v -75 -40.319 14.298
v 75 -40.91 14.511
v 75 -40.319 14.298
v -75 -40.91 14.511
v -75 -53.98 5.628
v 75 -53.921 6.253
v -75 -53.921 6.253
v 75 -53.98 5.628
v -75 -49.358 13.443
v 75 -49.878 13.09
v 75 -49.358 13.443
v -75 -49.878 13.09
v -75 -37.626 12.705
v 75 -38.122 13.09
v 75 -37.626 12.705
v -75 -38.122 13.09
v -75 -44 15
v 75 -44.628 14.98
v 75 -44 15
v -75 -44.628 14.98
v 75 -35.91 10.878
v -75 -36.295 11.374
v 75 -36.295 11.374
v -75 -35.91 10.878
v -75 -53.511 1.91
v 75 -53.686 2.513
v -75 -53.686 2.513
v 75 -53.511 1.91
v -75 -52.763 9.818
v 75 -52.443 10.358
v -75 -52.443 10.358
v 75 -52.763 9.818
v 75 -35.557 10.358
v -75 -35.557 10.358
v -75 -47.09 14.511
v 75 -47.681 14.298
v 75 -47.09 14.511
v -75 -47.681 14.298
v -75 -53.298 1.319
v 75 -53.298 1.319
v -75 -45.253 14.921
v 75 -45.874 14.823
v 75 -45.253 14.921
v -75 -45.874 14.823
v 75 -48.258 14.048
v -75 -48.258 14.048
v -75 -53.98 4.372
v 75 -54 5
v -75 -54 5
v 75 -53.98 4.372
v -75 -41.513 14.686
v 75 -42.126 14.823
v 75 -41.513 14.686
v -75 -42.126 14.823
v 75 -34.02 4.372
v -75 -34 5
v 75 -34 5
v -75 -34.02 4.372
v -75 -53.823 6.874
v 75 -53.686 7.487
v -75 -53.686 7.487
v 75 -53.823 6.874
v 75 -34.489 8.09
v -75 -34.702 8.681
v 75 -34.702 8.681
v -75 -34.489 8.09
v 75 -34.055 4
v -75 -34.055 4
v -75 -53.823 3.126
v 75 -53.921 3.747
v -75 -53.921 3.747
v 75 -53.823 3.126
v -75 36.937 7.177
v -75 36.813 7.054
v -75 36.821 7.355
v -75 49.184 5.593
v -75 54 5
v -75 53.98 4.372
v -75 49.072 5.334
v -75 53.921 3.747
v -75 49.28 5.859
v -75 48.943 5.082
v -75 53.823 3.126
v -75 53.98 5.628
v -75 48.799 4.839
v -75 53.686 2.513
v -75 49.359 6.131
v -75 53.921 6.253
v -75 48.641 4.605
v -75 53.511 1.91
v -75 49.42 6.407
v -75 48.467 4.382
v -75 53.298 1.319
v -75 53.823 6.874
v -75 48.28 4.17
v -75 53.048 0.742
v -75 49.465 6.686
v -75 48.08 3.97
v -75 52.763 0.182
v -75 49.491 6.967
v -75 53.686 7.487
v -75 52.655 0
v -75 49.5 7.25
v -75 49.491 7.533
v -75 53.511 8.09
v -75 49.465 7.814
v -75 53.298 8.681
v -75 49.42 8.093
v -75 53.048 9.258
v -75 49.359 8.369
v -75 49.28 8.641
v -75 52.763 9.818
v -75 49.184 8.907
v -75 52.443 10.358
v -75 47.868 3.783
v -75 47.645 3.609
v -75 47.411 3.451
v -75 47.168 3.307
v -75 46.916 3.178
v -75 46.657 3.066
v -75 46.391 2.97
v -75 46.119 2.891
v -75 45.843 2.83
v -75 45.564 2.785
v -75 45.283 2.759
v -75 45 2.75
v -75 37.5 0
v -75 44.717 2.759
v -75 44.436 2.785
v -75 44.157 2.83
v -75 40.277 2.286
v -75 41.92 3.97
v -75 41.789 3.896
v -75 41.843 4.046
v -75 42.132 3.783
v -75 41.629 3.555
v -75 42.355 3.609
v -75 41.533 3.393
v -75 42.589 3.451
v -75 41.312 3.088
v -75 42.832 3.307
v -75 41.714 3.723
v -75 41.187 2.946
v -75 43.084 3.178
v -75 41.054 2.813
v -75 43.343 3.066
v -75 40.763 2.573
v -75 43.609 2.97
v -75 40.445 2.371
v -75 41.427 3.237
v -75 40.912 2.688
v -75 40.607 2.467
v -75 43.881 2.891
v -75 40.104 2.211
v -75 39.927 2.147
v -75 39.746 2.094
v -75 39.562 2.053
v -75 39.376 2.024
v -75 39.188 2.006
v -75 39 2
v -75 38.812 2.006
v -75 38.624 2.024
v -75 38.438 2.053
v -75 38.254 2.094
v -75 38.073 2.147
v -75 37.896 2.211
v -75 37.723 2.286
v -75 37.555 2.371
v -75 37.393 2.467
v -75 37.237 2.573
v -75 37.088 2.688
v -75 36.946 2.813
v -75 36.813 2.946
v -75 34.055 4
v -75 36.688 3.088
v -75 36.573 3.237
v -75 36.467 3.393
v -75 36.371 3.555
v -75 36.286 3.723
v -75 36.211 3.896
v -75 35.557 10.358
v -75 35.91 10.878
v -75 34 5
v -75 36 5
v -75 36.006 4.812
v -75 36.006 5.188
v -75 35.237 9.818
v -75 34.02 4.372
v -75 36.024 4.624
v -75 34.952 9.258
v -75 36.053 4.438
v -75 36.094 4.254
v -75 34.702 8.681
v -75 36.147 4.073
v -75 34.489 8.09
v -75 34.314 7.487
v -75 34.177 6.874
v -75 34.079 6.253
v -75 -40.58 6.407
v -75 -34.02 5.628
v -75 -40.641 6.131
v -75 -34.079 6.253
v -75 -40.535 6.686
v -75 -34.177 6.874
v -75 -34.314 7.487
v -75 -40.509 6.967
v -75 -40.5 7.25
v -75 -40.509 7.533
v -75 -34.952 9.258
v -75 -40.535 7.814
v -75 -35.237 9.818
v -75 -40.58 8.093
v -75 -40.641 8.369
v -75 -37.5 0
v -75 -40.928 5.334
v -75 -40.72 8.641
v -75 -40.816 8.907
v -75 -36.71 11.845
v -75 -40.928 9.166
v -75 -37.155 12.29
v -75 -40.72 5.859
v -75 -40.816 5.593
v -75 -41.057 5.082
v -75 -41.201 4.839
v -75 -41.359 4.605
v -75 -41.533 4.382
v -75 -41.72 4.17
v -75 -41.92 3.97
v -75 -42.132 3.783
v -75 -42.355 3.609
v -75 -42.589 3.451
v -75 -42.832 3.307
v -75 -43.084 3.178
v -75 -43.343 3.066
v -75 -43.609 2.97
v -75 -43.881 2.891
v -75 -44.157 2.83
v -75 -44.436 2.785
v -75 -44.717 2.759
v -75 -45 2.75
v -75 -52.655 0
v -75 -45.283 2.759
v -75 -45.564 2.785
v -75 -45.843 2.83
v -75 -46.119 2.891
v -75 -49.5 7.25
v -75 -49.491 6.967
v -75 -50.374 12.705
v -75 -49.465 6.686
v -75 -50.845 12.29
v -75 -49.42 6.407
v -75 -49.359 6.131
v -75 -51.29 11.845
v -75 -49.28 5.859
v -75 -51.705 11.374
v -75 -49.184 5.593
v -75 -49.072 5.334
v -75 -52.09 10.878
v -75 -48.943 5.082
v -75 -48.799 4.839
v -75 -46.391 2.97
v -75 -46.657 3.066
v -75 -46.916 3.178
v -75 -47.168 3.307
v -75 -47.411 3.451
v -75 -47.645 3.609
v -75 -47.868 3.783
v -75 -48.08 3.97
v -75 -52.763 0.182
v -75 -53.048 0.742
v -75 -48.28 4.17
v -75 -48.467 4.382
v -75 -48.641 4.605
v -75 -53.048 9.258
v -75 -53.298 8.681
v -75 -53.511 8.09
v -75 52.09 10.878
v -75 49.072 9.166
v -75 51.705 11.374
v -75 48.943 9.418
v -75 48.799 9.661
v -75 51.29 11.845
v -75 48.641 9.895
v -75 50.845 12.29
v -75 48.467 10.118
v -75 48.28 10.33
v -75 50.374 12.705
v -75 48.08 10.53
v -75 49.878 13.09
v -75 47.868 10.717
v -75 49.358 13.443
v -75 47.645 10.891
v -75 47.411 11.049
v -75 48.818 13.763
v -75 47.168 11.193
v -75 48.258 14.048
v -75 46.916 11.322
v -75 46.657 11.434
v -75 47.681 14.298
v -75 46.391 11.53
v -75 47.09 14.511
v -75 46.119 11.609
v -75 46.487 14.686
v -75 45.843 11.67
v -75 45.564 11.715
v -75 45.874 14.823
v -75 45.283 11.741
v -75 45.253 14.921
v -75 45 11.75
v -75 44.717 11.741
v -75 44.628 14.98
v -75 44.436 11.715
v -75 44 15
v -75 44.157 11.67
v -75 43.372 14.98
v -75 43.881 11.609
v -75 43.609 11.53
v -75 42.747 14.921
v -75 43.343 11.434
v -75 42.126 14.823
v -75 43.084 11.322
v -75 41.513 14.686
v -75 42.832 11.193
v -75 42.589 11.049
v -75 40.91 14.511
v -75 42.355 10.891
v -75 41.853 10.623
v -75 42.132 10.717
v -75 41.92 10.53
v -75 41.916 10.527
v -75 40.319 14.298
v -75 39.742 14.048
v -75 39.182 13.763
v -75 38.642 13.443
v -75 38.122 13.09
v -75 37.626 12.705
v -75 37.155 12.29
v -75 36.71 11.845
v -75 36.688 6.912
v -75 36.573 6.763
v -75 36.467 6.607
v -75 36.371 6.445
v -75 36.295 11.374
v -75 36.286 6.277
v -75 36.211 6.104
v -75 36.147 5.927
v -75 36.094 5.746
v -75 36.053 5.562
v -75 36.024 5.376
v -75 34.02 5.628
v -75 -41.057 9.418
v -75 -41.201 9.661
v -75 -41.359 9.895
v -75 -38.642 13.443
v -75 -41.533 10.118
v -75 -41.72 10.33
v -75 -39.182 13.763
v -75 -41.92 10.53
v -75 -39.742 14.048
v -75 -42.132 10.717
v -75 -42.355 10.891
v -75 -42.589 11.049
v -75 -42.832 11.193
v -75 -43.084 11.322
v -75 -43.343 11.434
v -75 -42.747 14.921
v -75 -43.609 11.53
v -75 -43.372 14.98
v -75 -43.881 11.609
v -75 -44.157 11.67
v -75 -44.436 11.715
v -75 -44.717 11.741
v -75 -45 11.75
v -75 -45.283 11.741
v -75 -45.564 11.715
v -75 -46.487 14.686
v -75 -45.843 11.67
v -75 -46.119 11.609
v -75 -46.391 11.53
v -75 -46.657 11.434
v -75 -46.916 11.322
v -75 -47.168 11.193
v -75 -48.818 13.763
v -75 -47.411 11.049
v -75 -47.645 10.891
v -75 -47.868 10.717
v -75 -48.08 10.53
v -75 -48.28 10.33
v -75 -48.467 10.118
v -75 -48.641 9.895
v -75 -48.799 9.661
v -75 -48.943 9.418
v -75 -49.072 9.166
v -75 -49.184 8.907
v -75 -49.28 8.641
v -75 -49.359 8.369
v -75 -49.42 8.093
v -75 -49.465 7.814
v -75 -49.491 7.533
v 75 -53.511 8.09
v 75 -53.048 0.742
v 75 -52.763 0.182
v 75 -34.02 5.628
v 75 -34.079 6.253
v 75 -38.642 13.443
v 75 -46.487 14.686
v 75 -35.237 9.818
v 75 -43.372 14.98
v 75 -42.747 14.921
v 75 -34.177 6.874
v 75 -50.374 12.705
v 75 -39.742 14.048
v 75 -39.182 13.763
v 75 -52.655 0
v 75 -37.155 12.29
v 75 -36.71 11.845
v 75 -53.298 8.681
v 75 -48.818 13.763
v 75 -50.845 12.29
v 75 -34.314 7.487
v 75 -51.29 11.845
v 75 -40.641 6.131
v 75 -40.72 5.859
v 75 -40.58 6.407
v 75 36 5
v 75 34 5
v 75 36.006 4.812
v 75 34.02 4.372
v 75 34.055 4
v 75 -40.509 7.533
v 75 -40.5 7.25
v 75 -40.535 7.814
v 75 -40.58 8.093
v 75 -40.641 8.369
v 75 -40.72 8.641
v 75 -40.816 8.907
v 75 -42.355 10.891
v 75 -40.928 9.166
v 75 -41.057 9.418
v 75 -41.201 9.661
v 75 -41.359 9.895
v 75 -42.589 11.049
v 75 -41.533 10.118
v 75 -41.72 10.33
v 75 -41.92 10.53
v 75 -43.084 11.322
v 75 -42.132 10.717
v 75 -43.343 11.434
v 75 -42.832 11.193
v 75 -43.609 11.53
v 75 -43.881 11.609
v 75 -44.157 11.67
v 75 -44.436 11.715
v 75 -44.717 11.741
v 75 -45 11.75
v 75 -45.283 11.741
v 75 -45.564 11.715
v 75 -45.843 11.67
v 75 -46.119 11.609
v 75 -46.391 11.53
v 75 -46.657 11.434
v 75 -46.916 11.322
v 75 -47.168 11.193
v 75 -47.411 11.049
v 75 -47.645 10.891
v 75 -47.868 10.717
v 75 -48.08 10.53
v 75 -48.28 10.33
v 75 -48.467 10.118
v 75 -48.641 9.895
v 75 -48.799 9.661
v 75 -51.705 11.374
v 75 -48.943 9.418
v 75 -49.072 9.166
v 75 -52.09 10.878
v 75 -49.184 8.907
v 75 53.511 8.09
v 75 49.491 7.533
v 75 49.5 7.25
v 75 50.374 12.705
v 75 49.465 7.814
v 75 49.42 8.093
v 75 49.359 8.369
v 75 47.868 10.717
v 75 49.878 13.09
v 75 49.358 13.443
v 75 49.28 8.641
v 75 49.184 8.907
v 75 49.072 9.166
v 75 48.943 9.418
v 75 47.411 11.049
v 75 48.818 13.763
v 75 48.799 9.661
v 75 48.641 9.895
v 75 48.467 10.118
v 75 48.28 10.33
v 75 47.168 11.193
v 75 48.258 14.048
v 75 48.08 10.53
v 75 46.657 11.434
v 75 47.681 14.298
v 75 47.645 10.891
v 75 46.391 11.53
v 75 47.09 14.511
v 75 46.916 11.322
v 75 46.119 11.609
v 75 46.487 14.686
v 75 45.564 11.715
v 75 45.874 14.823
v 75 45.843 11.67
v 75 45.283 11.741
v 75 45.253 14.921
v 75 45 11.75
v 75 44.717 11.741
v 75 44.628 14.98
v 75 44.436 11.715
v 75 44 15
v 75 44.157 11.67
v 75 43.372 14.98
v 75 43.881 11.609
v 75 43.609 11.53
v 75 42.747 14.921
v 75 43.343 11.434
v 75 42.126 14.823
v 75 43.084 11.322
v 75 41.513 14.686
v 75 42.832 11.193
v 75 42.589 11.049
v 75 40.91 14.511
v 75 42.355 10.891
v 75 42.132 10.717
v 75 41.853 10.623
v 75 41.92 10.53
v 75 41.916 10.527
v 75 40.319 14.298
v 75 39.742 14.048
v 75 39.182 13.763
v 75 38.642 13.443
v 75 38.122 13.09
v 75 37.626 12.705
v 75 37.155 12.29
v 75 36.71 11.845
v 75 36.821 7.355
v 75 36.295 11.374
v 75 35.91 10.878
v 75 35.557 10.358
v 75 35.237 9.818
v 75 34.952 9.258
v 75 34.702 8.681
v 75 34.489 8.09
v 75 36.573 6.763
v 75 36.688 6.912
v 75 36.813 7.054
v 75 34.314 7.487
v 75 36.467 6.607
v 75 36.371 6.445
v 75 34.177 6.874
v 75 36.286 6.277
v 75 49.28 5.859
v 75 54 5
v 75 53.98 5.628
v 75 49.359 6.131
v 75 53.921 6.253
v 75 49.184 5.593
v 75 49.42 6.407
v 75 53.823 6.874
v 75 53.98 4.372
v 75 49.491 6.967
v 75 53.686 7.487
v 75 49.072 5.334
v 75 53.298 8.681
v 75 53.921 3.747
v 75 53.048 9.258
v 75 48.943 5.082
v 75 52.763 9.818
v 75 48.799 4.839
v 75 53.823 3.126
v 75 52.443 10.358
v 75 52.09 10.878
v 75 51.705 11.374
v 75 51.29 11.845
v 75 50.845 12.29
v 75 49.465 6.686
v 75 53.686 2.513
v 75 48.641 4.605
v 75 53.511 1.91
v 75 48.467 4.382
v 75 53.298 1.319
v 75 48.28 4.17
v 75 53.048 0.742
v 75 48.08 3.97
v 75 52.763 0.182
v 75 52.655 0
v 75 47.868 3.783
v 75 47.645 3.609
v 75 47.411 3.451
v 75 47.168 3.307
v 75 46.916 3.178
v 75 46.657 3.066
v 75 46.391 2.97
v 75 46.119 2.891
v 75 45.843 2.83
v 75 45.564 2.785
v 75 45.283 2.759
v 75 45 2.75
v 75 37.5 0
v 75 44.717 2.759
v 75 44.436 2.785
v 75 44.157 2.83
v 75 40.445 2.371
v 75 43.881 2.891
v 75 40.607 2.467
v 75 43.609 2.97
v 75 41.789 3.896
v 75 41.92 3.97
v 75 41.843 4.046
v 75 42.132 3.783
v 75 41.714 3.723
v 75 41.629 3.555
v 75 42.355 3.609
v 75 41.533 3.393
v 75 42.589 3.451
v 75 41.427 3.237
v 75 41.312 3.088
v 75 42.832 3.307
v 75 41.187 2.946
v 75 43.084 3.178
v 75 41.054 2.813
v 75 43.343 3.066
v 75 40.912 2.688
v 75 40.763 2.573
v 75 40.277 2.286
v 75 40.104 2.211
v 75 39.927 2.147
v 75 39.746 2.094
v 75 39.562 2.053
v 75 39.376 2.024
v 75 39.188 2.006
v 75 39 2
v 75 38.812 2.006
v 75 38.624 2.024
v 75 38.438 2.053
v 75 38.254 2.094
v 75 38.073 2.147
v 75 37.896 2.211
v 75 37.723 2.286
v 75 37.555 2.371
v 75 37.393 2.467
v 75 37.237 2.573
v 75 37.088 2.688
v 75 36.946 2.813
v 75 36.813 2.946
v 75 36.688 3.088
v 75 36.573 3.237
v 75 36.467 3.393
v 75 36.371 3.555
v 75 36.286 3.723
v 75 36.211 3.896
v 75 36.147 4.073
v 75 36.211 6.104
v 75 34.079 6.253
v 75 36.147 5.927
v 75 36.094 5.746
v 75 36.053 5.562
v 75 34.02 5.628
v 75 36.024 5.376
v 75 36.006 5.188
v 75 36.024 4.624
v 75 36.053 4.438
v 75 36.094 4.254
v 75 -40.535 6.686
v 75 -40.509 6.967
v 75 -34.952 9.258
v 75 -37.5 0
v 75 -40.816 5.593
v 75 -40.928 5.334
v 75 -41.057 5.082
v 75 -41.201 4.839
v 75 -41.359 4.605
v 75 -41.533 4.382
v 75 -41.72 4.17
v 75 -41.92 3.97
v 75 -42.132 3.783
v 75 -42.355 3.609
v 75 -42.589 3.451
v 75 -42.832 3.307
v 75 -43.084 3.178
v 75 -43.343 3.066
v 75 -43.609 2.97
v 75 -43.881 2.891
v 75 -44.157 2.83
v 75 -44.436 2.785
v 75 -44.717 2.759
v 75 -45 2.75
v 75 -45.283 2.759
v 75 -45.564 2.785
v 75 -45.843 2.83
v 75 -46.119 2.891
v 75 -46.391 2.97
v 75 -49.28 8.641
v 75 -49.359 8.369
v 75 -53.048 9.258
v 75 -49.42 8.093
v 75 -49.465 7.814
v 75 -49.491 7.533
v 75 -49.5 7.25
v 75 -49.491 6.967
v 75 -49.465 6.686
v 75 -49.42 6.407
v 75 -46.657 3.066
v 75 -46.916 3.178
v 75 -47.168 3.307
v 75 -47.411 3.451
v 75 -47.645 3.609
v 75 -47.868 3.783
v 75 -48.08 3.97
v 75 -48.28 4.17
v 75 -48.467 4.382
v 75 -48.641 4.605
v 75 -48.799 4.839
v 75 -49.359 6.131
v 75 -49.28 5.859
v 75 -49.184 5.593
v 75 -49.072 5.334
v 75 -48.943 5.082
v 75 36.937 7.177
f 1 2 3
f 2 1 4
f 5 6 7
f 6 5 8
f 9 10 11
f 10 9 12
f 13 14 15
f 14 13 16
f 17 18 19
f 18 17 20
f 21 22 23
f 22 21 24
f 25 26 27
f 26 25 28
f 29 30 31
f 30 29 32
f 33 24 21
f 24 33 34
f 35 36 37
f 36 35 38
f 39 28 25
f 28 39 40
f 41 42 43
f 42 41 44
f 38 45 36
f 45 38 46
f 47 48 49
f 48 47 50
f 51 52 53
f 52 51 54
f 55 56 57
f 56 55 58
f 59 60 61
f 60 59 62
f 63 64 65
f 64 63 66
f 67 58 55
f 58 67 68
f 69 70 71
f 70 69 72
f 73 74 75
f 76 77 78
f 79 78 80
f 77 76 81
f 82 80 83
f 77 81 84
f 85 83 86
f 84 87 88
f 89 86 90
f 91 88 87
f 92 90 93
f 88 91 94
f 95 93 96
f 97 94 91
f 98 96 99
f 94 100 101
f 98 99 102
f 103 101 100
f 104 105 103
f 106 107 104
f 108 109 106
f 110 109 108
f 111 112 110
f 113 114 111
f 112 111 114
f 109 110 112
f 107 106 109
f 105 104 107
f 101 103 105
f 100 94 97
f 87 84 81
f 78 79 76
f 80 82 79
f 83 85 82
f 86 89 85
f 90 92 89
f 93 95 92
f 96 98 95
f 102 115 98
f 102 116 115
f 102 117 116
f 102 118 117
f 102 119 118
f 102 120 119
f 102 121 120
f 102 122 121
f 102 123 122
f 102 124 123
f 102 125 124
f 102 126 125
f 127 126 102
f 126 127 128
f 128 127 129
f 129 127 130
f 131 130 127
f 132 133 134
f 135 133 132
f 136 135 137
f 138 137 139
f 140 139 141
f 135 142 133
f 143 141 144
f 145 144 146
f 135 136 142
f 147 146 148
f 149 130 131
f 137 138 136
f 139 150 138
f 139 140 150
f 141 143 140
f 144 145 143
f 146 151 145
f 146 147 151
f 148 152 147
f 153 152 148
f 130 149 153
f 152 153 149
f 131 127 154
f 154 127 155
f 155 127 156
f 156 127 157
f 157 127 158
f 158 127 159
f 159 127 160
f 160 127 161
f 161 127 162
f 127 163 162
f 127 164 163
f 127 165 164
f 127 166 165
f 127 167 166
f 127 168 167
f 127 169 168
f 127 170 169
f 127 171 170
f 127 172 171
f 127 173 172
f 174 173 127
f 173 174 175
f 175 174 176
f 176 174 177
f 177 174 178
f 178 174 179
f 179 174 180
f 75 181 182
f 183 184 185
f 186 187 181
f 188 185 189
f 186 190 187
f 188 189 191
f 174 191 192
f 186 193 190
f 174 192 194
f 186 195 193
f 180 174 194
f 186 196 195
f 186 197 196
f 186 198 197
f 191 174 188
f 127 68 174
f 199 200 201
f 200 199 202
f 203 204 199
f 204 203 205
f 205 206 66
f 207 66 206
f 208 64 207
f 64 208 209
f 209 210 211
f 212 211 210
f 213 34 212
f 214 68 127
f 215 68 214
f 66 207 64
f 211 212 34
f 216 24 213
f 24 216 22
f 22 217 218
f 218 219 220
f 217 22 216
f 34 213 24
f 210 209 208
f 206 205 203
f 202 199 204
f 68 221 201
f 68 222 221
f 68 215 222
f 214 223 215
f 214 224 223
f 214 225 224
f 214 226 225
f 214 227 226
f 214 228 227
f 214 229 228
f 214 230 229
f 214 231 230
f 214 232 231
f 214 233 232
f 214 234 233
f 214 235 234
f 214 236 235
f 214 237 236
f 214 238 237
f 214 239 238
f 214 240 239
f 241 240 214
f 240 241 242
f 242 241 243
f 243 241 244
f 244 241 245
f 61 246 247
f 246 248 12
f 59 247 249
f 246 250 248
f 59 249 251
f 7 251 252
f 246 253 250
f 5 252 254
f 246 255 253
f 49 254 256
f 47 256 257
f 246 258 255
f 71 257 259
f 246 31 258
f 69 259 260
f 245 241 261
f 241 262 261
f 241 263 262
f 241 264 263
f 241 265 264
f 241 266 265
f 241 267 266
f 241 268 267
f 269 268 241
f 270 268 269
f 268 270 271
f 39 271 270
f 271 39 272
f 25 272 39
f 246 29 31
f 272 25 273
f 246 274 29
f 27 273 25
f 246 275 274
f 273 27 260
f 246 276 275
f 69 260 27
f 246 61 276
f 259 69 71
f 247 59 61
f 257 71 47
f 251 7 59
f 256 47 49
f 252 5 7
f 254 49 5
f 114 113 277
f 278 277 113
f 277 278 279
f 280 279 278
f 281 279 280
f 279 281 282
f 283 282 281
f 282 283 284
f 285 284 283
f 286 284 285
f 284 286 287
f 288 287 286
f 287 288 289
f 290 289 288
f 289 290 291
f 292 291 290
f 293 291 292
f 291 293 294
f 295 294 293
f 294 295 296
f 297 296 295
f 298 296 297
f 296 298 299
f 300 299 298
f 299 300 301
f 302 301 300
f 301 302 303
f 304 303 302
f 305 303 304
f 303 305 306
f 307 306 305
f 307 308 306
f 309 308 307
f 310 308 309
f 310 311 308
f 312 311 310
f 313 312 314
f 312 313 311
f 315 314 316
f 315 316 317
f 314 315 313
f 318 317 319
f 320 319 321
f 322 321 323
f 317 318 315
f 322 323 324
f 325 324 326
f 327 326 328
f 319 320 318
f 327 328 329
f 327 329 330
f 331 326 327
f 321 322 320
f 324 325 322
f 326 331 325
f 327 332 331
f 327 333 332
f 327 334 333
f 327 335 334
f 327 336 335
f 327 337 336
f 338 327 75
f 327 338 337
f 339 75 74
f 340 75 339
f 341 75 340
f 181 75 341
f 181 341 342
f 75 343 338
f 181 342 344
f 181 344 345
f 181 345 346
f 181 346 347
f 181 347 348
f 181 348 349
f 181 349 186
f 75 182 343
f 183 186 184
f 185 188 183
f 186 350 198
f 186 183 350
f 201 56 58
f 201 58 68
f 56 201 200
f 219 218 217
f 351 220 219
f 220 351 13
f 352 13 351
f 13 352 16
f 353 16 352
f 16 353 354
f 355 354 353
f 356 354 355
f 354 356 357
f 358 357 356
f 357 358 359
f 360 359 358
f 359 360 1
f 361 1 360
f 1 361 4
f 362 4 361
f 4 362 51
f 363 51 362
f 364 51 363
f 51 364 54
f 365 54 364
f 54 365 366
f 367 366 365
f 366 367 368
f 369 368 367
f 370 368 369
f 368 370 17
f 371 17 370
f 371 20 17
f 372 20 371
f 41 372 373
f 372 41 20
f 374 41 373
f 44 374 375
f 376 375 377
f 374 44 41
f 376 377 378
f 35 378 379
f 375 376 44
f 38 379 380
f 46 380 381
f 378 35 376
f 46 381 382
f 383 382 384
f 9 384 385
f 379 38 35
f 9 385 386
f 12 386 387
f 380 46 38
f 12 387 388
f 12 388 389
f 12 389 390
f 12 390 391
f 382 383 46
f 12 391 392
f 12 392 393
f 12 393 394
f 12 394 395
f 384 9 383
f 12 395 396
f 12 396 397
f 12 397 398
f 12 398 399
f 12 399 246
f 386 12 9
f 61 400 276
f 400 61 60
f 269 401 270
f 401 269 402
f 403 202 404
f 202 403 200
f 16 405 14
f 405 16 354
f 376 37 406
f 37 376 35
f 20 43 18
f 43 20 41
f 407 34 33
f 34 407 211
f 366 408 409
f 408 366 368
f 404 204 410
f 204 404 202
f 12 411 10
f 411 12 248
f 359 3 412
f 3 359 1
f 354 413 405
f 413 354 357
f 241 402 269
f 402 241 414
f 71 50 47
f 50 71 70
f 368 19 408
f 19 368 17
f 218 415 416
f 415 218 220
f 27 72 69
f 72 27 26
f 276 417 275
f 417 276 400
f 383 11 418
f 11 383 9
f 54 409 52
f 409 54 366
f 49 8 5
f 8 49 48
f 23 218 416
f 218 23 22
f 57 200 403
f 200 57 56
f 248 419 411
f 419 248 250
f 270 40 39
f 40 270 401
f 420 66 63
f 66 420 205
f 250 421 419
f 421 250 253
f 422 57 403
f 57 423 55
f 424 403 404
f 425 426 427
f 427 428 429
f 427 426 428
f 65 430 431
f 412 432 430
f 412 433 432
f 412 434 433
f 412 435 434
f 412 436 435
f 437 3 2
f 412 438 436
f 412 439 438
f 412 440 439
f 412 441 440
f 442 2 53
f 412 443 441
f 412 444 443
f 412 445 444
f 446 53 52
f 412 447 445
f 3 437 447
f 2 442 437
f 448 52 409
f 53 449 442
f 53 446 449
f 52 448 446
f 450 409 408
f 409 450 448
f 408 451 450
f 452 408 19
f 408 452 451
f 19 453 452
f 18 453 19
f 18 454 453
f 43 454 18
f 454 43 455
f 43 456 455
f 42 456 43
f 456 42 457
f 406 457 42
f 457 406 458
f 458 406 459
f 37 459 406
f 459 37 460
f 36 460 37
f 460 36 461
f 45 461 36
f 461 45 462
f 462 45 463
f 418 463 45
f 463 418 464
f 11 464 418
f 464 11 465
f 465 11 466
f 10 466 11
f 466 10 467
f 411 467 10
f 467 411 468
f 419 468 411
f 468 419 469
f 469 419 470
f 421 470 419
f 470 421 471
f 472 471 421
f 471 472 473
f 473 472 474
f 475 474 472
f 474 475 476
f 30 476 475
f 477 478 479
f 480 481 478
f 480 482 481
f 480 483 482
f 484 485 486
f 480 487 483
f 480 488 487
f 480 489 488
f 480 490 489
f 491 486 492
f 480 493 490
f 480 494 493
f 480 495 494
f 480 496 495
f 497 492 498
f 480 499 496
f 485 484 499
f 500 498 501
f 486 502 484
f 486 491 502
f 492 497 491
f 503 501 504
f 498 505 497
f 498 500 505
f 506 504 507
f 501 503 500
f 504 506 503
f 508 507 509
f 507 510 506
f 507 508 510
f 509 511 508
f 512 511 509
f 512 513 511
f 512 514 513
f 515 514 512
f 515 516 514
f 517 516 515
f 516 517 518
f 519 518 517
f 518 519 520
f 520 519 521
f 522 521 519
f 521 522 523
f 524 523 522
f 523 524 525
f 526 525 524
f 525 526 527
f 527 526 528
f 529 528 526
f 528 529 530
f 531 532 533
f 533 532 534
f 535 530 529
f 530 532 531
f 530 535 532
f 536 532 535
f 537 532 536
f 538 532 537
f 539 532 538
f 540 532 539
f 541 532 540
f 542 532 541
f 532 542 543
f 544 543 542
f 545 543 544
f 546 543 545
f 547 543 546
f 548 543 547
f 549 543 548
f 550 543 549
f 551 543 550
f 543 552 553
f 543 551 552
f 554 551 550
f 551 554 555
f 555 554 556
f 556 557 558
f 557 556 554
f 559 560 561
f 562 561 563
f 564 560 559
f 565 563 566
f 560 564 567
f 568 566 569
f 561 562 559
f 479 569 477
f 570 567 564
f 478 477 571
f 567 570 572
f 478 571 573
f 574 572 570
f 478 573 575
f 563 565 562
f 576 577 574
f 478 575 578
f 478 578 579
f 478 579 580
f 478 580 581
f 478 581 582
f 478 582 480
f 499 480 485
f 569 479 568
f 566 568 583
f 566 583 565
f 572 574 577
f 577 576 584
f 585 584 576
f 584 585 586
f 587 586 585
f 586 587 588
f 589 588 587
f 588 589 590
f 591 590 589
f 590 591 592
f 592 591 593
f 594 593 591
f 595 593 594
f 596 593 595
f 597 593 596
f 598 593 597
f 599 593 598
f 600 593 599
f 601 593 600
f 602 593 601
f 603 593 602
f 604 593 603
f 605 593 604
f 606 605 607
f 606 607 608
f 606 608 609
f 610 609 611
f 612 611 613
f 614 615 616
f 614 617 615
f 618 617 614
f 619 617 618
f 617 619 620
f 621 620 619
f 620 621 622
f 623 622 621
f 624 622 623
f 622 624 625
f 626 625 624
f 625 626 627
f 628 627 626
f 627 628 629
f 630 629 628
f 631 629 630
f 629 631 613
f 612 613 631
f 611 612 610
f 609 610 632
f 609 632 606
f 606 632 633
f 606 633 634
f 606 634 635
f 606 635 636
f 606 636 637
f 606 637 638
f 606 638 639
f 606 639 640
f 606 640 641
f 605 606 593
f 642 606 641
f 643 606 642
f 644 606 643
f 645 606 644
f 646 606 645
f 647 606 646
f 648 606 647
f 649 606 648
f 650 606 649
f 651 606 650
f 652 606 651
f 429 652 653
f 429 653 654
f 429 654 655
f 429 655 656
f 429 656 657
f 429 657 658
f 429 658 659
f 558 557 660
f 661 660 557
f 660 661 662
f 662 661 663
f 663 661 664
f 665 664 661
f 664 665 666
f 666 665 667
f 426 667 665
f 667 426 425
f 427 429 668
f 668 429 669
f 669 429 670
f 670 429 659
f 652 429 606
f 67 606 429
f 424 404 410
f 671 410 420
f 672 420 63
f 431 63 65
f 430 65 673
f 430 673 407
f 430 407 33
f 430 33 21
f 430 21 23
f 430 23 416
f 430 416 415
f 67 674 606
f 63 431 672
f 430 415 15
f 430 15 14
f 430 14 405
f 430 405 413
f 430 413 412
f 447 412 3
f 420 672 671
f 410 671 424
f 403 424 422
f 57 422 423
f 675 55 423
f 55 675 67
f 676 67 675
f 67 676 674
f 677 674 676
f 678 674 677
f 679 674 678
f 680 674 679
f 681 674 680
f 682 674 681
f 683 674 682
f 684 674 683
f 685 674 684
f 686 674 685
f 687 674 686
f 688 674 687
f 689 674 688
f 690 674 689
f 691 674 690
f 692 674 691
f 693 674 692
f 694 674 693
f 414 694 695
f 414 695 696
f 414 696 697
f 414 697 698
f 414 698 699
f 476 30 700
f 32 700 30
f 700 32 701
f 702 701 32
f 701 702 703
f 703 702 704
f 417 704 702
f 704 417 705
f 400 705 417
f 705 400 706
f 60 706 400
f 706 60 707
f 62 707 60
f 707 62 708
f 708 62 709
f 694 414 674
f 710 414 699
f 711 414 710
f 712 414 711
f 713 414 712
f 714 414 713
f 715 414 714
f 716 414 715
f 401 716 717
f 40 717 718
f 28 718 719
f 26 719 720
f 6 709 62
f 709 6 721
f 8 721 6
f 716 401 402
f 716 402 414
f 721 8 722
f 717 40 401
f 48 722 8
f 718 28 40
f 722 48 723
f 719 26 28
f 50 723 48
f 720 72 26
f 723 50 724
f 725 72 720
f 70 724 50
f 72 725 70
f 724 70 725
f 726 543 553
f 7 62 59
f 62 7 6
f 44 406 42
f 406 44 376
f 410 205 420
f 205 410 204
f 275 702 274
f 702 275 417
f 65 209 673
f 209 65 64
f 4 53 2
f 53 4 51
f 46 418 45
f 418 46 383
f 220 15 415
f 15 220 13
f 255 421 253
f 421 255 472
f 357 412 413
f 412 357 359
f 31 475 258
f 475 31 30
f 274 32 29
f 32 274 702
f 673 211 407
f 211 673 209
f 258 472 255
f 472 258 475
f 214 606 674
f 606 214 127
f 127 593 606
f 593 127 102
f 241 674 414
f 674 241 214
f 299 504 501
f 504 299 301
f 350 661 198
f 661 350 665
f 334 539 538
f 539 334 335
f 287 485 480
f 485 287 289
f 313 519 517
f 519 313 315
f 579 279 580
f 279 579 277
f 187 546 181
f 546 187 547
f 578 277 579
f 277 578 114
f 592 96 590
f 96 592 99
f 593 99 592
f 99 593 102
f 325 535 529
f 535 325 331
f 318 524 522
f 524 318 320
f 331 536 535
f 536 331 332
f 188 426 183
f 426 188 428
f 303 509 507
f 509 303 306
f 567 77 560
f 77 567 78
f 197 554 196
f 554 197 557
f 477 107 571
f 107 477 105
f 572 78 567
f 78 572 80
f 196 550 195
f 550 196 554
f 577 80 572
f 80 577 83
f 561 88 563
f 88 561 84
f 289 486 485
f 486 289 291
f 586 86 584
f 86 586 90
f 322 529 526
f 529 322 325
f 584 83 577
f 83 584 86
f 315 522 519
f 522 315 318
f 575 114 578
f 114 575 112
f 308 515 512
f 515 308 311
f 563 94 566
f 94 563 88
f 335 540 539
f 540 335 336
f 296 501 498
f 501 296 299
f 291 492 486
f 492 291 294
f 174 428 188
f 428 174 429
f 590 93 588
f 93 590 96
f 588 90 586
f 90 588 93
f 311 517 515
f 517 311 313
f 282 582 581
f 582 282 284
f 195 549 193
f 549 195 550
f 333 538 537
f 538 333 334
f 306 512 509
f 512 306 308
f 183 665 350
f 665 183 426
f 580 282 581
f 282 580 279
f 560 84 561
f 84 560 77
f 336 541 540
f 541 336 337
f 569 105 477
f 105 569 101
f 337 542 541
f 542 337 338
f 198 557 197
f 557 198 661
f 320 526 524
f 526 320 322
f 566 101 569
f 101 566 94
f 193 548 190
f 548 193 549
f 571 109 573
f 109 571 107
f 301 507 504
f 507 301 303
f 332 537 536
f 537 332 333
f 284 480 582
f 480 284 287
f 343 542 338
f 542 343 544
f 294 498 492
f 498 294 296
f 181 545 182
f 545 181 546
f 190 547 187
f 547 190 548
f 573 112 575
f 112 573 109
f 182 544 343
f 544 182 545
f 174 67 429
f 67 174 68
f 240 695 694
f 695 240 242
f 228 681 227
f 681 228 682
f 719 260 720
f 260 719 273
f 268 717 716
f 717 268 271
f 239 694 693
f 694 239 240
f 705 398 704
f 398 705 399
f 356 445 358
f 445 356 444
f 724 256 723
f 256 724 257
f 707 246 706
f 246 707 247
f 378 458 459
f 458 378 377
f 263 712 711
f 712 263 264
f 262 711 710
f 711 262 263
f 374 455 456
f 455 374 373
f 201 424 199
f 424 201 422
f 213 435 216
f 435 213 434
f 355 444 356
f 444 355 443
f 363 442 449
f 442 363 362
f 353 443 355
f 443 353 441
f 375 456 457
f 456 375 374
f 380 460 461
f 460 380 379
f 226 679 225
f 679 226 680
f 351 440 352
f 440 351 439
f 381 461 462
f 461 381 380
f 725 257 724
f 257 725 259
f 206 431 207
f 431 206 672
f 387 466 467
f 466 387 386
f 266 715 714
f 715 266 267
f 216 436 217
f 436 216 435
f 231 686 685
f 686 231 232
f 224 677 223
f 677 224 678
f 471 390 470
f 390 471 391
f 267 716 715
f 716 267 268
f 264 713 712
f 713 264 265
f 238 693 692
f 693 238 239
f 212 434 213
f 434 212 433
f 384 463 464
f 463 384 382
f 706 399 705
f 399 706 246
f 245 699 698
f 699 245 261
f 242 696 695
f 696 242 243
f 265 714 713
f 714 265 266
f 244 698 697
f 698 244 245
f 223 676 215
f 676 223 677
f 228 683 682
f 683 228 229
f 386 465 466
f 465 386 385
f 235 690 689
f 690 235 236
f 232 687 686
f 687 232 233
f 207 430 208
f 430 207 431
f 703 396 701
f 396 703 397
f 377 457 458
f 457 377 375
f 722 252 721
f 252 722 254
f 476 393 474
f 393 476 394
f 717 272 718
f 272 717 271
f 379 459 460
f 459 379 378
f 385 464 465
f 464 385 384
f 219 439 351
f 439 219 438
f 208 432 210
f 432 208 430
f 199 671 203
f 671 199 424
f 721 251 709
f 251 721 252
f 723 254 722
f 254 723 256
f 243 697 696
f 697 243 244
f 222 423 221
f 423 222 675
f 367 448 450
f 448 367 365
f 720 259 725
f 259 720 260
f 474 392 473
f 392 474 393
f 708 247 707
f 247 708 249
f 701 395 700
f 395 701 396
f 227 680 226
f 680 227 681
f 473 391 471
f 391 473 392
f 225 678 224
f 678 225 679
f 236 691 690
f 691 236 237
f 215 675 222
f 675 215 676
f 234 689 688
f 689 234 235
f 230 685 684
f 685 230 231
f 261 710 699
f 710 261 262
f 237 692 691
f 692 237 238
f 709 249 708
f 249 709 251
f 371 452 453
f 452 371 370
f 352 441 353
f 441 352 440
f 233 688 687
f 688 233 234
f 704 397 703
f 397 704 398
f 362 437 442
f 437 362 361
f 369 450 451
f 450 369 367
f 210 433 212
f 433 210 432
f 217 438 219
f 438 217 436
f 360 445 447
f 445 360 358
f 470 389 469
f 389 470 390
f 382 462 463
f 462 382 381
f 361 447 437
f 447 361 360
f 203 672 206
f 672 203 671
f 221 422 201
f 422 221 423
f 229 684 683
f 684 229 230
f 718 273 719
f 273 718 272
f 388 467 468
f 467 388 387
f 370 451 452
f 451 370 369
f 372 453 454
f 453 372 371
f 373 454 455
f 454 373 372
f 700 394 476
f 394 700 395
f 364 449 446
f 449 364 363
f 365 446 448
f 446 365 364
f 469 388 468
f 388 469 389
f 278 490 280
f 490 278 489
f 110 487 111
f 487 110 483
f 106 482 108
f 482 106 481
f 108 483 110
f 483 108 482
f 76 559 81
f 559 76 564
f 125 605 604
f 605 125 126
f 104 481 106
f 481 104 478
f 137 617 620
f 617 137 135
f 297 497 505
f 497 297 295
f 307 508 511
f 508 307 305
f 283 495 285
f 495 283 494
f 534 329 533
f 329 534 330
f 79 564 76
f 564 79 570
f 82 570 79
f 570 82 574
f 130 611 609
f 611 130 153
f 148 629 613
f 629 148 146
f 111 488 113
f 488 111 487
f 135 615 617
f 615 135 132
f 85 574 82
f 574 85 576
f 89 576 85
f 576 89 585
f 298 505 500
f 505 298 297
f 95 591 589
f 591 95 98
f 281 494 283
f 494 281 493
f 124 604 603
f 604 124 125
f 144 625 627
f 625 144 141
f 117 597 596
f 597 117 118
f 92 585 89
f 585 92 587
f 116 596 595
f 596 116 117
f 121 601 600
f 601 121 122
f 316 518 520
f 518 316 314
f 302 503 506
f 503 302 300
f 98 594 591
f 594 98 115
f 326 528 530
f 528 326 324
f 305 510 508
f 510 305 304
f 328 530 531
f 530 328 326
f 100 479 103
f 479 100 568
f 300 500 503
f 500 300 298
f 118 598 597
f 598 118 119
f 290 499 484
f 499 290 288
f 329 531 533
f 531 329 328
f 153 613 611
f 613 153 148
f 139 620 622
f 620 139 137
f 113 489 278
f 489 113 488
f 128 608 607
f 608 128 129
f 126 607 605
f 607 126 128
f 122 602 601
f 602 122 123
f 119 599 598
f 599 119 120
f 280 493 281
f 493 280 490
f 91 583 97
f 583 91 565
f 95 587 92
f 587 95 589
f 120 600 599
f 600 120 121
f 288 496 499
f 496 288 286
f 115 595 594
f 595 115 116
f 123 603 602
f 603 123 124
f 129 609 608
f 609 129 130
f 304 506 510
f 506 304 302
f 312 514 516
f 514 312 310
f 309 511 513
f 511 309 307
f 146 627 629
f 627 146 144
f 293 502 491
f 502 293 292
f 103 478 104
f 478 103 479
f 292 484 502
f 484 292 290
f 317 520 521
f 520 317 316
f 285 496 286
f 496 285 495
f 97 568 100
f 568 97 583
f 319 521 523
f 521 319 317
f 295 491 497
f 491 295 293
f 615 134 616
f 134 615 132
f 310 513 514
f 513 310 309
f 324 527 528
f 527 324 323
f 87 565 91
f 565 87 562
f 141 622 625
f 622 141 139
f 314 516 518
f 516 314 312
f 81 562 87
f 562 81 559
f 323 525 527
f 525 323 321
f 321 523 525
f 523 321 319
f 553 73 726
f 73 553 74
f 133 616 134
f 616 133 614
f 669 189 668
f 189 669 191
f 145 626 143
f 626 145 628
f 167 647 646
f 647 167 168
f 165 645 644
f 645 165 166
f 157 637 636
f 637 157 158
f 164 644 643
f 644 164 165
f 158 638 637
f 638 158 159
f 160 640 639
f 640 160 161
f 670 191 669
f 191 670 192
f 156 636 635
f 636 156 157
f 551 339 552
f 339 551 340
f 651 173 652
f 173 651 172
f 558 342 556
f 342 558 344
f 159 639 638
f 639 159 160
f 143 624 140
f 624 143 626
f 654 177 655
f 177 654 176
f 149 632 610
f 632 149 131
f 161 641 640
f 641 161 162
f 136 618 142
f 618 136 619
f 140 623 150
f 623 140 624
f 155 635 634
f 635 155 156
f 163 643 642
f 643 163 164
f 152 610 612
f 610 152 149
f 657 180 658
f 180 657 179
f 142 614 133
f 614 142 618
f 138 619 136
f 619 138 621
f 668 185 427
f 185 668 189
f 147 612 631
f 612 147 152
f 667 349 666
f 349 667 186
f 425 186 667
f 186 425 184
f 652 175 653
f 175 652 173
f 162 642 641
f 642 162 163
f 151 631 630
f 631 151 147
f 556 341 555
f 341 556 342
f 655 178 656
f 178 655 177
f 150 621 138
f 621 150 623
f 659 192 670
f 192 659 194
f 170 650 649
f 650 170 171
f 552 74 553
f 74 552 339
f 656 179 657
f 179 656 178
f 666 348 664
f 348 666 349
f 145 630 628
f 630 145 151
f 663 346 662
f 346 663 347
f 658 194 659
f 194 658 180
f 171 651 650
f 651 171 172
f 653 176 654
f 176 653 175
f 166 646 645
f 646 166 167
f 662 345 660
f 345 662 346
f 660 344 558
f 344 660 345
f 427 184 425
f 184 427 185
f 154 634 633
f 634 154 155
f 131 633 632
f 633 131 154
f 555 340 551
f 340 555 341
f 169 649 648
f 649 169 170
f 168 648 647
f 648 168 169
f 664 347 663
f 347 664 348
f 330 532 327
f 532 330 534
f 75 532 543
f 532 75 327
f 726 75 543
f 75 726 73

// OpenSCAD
// FabScan Base spacer
// CEB

baseLength = 150;


main();

module main() {
    difference() {
	union() {
	  handle();
	}
	 # translate([0,-45,7.25])   rotate ([0,90,0])   cylinder(h=baseLength + 5, r=4.5, center=true,$fn=100);  
	 # translate([0,45,7.25])    rotate ([0,90,0])   cylinder(h=baseLength + 5, r=4.5, center=true,$fn=100);
	 # translate([0,39,5])  rotate ([0,90,0])   cylinder(h=baseLength + 5, r=3, center=true,$fn=100); 
	 # translate([-baseLength /2 - 1,39,4])  rotate ([33,0,0]) cube([baseLength + 5,6,4]);
	
	
	}
	
 }

  module handle () {
      translate([-baseLength/2,-75/2, 0]) cube([baseLength,75,4]); // channel male	
      translate([0,-44,5])  partialTube(baseLength);
	  translate([0,44,5])  rotate ([0,0,0])partialTube(baseLength);
	 
 }
 
 module partialTube(TubeLength) {
     
	 difference() {
       translate([0,0,0])    rotate ([0,90,0])  cylinder(h=TubeLength, r=10, center=true,$fn=100); 
	   translate([-baseLength /2 -1 ,-10,-20])  cube([baseLength + 5 ,20,15]);
	
	 } 
 }
 
 
 
 
 
